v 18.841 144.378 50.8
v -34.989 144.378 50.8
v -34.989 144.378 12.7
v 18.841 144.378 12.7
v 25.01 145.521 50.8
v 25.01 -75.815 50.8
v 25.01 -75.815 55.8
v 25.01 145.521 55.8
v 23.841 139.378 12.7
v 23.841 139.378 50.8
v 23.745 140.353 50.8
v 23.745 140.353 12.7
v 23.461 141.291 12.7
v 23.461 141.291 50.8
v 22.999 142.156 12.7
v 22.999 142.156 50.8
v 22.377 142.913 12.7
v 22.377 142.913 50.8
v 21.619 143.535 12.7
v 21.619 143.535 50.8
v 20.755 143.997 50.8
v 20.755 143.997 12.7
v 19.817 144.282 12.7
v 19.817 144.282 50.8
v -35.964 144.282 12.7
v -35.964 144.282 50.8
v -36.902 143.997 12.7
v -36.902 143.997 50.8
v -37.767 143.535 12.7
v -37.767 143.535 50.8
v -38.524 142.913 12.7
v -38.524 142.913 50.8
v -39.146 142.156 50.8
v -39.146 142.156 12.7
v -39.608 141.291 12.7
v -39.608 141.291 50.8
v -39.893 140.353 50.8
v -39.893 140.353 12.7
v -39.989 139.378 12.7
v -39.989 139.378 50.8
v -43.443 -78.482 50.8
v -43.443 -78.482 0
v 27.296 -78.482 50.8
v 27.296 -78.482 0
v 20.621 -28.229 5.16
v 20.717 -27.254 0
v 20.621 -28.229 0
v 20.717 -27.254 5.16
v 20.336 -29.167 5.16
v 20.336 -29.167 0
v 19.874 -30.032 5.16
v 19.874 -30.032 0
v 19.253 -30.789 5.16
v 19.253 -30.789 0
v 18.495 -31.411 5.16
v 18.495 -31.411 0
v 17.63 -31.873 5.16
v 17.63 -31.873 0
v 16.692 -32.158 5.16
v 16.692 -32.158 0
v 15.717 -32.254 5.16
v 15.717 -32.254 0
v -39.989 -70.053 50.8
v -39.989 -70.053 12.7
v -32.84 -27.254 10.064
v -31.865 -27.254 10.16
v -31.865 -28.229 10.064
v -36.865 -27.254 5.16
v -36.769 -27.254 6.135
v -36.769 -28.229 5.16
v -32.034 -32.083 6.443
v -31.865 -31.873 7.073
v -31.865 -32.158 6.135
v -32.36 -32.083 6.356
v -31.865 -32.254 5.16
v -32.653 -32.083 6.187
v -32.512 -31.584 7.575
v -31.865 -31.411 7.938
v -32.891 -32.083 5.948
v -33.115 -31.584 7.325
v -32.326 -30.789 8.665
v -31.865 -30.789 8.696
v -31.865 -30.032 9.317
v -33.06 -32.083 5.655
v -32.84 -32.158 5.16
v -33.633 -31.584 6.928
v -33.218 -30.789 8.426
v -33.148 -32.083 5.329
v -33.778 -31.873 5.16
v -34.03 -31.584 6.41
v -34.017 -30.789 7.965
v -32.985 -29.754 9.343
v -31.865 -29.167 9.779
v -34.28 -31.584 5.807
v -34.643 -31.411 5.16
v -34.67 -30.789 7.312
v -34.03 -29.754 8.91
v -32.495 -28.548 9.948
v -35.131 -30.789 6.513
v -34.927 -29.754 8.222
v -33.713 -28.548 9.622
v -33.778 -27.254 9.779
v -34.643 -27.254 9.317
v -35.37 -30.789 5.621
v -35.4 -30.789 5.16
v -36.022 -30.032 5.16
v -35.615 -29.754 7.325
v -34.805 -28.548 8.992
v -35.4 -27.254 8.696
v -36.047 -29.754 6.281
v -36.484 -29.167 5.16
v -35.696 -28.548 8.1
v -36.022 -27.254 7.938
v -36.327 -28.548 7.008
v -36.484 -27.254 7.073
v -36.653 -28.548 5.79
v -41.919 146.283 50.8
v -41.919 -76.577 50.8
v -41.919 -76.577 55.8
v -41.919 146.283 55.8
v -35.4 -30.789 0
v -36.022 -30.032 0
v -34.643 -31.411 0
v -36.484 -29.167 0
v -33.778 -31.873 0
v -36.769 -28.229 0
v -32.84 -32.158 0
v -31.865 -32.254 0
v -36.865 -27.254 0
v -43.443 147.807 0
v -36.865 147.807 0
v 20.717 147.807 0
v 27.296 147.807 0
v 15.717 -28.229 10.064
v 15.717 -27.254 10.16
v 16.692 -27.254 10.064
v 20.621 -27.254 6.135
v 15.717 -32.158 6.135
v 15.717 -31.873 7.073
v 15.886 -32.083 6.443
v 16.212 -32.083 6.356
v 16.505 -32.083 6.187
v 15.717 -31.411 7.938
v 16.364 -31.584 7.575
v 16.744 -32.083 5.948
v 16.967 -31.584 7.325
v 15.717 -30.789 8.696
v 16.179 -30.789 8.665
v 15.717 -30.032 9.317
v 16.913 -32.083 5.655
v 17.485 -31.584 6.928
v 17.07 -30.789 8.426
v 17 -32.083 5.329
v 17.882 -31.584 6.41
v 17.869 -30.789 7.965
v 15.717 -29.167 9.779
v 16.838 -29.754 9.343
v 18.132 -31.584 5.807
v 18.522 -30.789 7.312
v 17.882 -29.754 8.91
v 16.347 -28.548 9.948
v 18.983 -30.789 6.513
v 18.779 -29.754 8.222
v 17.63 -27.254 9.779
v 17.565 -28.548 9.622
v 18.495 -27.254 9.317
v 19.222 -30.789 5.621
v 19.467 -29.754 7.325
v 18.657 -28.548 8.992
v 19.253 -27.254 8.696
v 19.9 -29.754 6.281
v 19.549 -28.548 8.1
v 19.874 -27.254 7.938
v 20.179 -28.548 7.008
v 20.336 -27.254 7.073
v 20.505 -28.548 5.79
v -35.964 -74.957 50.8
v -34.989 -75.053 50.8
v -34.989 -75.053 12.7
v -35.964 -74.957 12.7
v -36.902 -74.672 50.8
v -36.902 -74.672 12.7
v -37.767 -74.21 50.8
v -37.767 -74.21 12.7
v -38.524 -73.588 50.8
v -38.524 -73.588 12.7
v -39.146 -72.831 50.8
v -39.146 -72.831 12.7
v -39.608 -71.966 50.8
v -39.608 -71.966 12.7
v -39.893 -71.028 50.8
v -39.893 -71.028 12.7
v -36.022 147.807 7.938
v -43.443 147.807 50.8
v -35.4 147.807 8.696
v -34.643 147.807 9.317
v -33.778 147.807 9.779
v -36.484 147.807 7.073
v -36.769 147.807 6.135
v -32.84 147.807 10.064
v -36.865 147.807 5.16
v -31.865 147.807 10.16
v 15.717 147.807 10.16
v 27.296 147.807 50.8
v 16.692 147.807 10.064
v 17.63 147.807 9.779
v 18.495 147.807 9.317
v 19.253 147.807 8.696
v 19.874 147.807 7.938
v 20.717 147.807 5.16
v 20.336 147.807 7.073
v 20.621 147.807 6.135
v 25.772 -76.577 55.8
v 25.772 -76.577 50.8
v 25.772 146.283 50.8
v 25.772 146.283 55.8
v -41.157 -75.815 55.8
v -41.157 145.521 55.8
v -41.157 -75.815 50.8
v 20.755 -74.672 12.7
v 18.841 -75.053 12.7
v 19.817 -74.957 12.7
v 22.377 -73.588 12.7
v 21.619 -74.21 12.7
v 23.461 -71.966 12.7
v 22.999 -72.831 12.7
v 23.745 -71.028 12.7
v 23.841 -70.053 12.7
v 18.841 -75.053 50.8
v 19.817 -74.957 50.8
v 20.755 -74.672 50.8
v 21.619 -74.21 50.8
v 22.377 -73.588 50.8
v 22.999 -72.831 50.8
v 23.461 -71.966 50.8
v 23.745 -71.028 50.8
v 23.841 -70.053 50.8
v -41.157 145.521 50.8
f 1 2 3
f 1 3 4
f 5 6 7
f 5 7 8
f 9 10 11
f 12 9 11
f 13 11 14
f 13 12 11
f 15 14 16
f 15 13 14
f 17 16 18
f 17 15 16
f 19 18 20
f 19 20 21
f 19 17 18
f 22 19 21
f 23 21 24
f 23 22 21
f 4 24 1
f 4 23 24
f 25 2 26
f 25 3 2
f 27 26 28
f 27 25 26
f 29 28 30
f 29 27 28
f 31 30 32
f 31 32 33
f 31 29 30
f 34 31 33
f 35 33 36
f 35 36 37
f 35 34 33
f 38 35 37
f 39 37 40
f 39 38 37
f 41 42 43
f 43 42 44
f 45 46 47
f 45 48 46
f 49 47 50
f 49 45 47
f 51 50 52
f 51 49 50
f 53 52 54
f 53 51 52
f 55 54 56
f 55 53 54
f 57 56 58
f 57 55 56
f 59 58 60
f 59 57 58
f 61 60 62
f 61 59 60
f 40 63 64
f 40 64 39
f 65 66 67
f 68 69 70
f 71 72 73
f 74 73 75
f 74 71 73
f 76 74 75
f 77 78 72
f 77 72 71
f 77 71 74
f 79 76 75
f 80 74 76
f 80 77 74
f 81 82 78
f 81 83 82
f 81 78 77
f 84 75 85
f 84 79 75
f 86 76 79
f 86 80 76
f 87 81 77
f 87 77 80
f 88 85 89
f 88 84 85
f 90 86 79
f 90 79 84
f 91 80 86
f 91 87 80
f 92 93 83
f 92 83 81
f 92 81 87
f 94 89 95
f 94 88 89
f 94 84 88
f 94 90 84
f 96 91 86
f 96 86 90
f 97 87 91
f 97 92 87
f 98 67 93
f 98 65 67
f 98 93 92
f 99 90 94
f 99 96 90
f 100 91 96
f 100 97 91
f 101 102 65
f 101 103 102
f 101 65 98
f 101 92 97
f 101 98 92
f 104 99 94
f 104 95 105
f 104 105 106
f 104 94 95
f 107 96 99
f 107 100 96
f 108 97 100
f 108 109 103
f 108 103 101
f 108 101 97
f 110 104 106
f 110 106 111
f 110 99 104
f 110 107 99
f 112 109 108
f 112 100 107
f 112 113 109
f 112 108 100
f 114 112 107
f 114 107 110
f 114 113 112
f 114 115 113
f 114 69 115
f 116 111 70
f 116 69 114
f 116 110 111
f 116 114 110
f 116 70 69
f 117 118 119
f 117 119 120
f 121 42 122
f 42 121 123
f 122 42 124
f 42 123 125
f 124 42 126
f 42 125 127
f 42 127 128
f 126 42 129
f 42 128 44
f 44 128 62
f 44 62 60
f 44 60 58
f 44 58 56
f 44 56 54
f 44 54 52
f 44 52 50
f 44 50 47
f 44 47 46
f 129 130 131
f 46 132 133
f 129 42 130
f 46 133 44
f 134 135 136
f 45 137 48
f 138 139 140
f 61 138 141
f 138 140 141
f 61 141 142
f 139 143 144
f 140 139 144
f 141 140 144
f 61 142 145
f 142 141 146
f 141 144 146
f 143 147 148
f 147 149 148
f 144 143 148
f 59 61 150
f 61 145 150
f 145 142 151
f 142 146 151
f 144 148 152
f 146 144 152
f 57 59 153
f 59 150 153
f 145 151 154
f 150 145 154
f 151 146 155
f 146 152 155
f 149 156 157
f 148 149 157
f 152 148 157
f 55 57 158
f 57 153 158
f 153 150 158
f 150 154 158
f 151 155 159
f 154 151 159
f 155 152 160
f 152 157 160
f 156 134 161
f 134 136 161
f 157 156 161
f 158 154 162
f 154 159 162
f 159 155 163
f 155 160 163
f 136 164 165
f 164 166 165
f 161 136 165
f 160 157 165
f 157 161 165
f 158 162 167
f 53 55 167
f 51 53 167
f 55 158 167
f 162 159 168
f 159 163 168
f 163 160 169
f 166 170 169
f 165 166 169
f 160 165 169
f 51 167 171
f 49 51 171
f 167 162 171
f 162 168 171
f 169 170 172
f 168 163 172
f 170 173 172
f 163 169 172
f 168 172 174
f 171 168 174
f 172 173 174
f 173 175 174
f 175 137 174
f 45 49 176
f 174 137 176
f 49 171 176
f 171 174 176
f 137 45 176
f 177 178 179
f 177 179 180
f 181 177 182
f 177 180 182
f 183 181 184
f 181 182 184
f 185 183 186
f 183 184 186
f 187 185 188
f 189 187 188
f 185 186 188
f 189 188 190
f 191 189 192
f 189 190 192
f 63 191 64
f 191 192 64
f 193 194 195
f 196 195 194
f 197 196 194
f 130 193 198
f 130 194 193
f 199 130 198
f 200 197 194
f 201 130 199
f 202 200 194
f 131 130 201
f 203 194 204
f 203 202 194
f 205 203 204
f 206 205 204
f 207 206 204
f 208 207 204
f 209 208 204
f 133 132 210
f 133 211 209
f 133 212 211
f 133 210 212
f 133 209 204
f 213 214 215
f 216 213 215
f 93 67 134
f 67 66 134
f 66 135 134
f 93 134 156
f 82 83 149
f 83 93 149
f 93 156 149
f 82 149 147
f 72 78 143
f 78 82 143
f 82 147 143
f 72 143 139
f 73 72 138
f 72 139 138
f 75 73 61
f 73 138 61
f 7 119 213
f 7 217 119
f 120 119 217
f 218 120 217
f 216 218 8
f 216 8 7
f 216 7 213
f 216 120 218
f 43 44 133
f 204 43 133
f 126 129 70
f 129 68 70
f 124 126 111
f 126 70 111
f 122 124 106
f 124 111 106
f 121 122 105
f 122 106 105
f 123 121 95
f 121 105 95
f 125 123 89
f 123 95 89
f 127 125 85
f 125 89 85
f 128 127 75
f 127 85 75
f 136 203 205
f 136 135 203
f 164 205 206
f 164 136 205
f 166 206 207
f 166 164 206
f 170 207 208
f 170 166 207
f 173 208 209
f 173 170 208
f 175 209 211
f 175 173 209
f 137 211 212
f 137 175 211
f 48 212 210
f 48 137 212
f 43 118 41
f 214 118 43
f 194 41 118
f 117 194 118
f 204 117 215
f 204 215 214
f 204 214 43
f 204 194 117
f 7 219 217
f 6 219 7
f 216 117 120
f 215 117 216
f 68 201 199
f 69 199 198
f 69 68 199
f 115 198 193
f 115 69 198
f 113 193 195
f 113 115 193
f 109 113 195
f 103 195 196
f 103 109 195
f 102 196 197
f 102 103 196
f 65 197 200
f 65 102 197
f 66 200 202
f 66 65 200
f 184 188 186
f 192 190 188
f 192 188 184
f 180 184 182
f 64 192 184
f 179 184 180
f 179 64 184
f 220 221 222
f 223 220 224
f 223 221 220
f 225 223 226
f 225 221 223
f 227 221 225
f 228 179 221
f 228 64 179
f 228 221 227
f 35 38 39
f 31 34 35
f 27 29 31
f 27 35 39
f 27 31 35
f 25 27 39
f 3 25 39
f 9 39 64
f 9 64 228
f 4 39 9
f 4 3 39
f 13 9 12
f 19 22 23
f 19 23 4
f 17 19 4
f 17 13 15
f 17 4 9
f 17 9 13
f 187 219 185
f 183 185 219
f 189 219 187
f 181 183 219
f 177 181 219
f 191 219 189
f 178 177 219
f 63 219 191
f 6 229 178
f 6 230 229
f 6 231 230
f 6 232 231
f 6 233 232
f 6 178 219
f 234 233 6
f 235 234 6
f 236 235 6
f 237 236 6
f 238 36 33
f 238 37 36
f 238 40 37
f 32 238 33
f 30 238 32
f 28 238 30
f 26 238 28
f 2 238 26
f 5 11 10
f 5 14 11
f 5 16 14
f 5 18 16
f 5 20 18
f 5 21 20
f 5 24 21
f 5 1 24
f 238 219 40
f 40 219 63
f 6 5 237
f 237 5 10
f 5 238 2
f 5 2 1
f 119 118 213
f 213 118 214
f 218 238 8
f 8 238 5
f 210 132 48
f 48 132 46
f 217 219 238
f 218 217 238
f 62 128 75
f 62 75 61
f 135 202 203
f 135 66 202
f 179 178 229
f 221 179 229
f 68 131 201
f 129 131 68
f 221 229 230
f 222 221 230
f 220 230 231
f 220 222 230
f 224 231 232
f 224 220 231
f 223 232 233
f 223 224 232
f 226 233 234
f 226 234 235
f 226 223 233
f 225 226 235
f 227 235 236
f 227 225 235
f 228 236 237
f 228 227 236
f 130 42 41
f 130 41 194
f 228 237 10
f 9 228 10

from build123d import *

# Parameters (mm, degrees)
F0_W     = 70.739
F0_H     = 226.2886
F1_DEPTH = 50.8
F2_W     = 63.8302
F2_H     = 219.4306
F3_DEPTH = 38.1
F4_W     = 57.5818
F4_H     = 180.0606
F5_DEPTH = 10.16
F6_R     = 5
F7_W     = 67.691
F7_H     = 222.8596
F7_W_2   = 66.167
F7_H_2   = 221.3356
F8_DEPTH = 5


with BuildPart() as f1:
    # F0 (on Top) → F1 (new body)
    with BuildSketch(Plane.XY):
        with Locations((-8.073856, 34.662454)):
            Rectangle(F0_W, F0_H)
    extrude(amount=F1_DEPTH)

    # F2 (on face) → F3 (cut)
    with BuildSketch(Plane.XY.offset(50.8)):
        with Locations((-8.073856, 34.662454)):
            Rectangle(F2_W, F2_H)
    extrude(amount=-F3_DEPTH, mode=Mode.SUBTRACT)

    # F4 (on face) → F5 (cut)
    with BuildSketch(Plane(origin=(0, 0, 0), x_dir=(1, 0, 0), z_dir=(0, 0, -1))):
        with Locations((-8.073856, -57.776454)):
            Rectangle(F4_W, F4_H)
    extrude(amount=-F5_DEPTH, mode=Mode.SUBTRACT)

    # F6
    f6_edges = [f1.edges().sort_by_distance(p)[0] for p in [
        (-36.864756, 57.776454, 10.16),
        (20.717044, 57.776454, 10.16),
        (-8.073856, -32.253846, 10.16),
        (-36.864756, -32.253846, 5.08),
        (20.717044, -32.253846, 5.08),
        (-39.988956, -75.052846, 31.75),
        (-39.988956, 144.377754, 31.75),
        (23.841244, 144.377754, 31.75),
        (23.841244, -75.052846, 31.75),
    ]]
    fillet(f6_edges, radius=F6_R)

    # F7 (on face) → F8 (join)
    with BuildSketch(Plane.XY.offset(50.8)):
        with Locations((-8.073856, 34.852954)):
            Rectangle(F7_W, F7_H)
        with Locations((-8.073856, 34.852954)):
            Rectangle(F7_W_2, F7_H_2, mode=Mode.SUBTRACT)
    extrude(amount=F8_DEPTH)


solid = f1.part
